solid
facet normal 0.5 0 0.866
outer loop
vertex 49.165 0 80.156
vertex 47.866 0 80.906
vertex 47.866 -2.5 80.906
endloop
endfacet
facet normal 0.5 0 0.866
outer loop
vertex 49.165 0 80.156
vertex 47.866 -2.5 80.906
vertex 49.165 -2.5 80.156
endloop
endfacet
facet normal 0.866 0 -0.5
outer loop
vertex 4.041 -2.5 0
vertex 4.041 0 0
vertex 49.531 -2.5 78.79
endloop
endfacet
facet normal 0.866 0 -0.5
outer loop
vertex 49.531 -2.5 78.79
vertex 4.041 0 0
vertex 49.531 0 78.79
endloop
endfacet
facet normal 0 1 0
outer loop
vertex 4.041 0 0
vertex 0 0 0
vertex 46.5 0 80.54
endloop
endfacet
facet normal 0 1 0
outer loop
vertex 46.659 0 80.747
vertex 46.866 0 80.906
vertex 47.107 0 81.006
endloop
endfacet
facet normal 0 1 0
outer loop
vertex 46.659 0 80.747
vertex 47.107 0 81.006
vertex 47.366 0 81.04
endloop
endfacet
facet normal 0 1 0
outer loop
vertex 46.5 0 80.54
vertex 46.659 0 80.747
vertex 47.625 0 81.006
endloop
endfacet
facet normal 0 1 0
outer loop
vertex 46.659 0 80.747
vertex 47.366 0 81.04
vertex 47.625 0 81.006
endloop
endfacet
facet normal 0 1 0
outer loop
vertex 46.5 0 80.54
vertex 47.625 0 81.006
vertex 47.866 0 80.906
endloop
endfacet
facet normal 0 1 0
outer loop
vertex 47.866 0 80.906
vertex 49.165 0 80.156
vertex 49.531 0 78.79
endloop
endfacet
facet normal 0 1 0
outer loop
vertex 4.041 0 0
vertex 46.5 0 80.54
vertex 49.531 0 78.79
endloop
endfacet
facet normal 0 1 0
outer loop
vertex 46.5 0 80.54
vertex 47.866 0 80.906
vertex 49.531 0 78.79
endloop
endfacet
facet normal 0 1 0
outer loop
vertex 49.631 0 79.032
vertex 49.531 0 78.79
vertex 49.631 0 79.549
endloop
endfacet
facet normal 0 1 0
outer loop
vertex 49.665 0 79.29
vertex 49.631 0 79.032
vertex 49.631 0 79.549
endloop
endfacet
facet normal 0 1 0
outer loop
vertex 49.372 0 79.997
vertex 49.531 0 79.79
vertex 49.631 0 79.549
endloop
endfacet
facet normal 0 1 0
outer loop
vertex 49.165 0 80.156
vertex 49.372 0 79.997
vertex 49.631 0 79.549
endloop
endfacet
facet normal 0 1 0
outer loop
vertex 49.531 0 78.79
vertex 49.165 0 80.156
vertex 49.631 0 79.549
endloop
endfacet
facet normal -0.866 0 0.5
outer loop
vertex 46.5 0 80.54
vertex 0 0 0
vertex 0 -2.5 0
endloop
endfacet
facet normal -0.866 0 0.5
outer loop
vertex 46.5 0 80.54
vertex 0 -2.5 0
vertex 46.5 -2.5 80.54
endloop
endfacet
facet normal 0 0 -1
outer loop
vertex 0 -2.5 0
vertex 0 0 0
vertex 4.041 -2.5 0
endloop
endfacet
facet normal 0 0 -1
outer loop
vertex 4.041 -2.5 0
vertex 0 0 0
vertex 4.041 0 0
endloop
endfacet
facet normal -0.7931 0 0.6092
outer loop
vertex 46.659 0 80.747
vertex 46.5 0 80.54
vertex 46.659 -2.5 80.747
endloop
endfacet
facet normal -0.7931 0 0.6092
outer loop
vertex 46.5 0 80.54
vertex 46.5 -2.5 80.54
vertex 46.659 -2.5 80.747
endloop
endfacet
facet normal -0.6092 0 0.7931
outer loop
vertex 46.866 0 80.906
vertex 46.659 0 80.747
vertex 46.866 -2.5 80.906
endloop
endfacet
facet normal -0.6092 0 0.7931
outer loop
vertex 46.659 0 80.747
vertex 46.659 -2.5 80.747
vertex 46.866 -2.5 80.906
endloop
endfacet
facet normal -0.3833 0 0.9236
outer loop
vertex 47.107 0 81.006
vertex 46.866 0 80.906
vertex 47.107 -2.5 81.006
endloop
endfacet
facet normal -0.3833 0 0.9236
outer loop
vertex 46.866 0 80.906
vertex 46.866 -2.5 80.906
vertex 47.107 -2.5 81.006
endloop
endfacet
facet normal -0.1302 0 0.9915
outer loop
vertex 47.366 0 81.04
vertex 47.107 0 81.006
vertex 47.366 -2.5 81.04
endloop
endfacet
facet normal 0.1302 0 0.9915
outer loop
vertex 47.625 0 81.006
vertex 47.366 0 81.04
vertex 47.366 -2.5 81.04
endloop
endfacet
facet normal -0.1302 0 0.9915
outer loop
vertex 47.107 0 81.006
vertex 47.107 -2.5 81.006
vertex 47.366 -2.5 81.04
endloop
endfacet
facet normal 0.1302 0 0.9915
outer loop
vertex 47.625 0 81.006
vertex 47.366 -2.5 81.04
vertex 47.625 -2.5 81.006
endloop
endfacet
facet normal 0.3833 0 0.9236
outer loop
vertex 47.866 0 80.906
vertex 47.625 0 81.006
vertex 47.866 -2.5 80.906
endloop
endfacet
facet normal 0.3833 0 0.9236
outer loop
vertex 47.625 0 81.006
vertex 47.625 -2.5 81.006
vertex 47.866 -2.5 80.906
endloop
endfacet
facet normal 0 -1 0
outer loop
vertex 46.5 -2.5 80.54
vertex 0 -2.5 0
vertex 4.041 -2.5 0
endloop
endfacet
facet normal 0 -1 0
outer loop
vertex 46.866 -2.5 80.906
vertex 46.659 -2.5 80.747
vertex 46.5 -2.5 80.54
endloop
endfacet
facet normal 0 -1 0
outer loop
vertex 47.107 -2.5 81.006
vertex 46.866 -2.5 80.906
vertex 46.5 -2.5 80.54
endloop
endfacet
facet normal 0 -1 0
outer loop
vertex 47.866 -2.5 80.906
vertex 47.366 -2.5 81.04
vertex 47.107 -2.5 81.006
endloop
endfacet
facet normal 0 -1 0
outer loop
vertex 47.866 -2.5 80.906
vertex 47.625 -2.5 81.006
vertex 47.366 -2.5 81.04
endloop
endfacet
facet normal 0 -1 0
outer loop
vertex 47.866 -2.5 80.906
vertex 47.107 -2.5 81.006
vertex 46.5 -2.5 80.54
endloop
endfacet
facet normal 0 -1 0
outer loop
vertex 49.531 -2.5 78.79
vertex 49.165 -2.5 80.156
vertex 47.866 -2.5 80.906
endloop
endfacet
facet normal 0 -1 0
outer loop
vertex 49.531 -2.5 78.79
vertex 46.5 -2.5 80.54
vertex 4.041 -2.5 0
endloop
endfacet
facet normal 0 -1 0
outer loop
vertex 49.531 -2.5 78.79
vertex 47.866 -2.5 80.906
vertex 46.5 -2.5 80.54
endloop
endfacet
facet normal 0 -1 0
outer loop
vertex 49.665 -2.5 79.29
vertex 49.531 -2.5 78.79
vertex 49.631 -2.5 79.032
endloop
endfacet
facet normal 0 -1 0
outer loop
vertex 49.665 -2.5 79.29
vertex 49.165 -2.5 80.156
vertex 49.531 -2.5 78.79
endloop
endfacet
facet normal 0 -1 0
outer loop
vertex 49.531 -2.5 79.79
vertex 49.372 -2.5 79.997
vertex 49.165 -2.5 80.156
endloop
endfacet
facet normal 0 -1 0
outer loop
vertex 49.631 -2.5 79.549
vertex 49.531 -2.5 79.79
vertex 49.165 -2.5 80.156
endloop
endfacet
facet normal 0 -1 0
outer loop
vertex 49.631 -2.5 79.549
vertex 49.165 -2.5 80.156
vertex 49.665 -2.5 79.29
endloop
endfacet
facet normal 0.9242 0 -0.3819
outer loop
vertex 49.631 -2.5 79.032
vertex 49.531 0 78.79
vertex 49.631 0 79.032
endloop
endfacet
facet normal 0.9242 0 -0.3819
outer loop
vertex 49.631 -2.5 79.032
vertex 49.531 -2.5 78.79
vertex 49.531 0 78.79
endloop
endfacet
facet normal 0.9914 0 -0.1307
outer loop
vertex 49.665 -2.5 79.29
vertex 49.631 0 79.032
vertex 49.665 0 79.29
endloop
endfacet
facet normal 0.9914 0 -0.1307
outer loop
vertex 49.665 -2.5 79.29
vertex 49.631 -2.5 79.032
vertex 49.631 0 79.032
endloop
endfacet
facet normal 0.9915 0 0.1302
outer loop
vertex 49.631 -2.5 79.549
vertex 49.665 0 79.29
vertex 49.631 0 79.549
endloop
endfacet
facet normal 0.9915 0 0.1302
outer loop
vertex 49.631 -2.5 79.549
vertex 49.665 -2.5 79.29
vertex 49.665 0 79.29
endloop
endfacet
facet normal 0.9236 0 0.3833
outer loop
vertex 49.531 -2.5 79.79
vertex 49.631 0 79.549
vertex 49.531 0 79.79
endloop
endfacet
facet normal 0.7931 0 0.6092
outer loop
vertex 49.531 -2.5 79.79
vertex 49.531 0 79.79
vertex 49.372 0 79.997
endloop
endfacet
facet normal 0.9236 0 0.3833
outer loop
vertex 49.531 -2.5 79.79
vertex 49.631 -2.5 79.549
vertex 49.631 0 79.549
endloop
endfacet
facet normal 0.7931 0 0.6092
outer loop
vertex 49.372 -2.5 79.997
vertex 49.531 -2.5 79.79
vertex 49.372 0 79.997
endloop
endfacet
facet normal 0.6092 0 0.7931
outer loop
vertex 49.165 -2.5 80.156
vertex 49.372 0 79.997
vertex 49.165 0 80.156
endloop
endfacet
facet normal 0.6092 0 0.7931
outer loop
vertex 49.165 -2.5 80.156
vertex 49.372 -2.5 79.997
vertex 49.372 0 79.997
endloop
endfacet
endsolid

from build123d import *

# Parameters (mm, degrees)
F0_W     = 3.5
F0_H     = 94
F1_DEPTH = 2.5
F2_R     = 1
F3_ANGLE = 30
F4_W     = 63.0289912224
F4_H     = 8.7771331891
F5_DEPTH = 25


with BuildPart() as f1:
    # F0 (on Front) → F1 (new body)
    with BuildSketch(Plane.XZ):
        with Locations((1.75, 47)):
            Rectangle(F0_W, F0_H)
    extrude(amount=F1_DEPTH)

    # F2
    f2_edges = [f1.edges().sort_by_distance(p)[0] for p in [
        (0, -1.25, 94),
        (3.5, -1.25, 94),
    ]]
    fillet(f2_edges, radius=F2_R)


with BuildPart() as f1_1:
    # F3: moved
    add(f1.part.rotate(Axis((0, -1.25, 0), (0, 1, 0)), F3_ANGLE))


with BuildPart() as f5:
    # F4 (on Front) → F5 (new body)
    with BuildSketch(Plane.XZ):
        with Locations((0.7424876094, -4.3885665946)):
            Rectangle(F4_W, F4_H)
    extrude(amount=F5_DEPTH)


with BuildPart() as f1_2:
    add(f1_1.part)

    # F6: cut F5
    add(f5.part, mode=Mode.SUBTRACT)


solid = f1_2.part
